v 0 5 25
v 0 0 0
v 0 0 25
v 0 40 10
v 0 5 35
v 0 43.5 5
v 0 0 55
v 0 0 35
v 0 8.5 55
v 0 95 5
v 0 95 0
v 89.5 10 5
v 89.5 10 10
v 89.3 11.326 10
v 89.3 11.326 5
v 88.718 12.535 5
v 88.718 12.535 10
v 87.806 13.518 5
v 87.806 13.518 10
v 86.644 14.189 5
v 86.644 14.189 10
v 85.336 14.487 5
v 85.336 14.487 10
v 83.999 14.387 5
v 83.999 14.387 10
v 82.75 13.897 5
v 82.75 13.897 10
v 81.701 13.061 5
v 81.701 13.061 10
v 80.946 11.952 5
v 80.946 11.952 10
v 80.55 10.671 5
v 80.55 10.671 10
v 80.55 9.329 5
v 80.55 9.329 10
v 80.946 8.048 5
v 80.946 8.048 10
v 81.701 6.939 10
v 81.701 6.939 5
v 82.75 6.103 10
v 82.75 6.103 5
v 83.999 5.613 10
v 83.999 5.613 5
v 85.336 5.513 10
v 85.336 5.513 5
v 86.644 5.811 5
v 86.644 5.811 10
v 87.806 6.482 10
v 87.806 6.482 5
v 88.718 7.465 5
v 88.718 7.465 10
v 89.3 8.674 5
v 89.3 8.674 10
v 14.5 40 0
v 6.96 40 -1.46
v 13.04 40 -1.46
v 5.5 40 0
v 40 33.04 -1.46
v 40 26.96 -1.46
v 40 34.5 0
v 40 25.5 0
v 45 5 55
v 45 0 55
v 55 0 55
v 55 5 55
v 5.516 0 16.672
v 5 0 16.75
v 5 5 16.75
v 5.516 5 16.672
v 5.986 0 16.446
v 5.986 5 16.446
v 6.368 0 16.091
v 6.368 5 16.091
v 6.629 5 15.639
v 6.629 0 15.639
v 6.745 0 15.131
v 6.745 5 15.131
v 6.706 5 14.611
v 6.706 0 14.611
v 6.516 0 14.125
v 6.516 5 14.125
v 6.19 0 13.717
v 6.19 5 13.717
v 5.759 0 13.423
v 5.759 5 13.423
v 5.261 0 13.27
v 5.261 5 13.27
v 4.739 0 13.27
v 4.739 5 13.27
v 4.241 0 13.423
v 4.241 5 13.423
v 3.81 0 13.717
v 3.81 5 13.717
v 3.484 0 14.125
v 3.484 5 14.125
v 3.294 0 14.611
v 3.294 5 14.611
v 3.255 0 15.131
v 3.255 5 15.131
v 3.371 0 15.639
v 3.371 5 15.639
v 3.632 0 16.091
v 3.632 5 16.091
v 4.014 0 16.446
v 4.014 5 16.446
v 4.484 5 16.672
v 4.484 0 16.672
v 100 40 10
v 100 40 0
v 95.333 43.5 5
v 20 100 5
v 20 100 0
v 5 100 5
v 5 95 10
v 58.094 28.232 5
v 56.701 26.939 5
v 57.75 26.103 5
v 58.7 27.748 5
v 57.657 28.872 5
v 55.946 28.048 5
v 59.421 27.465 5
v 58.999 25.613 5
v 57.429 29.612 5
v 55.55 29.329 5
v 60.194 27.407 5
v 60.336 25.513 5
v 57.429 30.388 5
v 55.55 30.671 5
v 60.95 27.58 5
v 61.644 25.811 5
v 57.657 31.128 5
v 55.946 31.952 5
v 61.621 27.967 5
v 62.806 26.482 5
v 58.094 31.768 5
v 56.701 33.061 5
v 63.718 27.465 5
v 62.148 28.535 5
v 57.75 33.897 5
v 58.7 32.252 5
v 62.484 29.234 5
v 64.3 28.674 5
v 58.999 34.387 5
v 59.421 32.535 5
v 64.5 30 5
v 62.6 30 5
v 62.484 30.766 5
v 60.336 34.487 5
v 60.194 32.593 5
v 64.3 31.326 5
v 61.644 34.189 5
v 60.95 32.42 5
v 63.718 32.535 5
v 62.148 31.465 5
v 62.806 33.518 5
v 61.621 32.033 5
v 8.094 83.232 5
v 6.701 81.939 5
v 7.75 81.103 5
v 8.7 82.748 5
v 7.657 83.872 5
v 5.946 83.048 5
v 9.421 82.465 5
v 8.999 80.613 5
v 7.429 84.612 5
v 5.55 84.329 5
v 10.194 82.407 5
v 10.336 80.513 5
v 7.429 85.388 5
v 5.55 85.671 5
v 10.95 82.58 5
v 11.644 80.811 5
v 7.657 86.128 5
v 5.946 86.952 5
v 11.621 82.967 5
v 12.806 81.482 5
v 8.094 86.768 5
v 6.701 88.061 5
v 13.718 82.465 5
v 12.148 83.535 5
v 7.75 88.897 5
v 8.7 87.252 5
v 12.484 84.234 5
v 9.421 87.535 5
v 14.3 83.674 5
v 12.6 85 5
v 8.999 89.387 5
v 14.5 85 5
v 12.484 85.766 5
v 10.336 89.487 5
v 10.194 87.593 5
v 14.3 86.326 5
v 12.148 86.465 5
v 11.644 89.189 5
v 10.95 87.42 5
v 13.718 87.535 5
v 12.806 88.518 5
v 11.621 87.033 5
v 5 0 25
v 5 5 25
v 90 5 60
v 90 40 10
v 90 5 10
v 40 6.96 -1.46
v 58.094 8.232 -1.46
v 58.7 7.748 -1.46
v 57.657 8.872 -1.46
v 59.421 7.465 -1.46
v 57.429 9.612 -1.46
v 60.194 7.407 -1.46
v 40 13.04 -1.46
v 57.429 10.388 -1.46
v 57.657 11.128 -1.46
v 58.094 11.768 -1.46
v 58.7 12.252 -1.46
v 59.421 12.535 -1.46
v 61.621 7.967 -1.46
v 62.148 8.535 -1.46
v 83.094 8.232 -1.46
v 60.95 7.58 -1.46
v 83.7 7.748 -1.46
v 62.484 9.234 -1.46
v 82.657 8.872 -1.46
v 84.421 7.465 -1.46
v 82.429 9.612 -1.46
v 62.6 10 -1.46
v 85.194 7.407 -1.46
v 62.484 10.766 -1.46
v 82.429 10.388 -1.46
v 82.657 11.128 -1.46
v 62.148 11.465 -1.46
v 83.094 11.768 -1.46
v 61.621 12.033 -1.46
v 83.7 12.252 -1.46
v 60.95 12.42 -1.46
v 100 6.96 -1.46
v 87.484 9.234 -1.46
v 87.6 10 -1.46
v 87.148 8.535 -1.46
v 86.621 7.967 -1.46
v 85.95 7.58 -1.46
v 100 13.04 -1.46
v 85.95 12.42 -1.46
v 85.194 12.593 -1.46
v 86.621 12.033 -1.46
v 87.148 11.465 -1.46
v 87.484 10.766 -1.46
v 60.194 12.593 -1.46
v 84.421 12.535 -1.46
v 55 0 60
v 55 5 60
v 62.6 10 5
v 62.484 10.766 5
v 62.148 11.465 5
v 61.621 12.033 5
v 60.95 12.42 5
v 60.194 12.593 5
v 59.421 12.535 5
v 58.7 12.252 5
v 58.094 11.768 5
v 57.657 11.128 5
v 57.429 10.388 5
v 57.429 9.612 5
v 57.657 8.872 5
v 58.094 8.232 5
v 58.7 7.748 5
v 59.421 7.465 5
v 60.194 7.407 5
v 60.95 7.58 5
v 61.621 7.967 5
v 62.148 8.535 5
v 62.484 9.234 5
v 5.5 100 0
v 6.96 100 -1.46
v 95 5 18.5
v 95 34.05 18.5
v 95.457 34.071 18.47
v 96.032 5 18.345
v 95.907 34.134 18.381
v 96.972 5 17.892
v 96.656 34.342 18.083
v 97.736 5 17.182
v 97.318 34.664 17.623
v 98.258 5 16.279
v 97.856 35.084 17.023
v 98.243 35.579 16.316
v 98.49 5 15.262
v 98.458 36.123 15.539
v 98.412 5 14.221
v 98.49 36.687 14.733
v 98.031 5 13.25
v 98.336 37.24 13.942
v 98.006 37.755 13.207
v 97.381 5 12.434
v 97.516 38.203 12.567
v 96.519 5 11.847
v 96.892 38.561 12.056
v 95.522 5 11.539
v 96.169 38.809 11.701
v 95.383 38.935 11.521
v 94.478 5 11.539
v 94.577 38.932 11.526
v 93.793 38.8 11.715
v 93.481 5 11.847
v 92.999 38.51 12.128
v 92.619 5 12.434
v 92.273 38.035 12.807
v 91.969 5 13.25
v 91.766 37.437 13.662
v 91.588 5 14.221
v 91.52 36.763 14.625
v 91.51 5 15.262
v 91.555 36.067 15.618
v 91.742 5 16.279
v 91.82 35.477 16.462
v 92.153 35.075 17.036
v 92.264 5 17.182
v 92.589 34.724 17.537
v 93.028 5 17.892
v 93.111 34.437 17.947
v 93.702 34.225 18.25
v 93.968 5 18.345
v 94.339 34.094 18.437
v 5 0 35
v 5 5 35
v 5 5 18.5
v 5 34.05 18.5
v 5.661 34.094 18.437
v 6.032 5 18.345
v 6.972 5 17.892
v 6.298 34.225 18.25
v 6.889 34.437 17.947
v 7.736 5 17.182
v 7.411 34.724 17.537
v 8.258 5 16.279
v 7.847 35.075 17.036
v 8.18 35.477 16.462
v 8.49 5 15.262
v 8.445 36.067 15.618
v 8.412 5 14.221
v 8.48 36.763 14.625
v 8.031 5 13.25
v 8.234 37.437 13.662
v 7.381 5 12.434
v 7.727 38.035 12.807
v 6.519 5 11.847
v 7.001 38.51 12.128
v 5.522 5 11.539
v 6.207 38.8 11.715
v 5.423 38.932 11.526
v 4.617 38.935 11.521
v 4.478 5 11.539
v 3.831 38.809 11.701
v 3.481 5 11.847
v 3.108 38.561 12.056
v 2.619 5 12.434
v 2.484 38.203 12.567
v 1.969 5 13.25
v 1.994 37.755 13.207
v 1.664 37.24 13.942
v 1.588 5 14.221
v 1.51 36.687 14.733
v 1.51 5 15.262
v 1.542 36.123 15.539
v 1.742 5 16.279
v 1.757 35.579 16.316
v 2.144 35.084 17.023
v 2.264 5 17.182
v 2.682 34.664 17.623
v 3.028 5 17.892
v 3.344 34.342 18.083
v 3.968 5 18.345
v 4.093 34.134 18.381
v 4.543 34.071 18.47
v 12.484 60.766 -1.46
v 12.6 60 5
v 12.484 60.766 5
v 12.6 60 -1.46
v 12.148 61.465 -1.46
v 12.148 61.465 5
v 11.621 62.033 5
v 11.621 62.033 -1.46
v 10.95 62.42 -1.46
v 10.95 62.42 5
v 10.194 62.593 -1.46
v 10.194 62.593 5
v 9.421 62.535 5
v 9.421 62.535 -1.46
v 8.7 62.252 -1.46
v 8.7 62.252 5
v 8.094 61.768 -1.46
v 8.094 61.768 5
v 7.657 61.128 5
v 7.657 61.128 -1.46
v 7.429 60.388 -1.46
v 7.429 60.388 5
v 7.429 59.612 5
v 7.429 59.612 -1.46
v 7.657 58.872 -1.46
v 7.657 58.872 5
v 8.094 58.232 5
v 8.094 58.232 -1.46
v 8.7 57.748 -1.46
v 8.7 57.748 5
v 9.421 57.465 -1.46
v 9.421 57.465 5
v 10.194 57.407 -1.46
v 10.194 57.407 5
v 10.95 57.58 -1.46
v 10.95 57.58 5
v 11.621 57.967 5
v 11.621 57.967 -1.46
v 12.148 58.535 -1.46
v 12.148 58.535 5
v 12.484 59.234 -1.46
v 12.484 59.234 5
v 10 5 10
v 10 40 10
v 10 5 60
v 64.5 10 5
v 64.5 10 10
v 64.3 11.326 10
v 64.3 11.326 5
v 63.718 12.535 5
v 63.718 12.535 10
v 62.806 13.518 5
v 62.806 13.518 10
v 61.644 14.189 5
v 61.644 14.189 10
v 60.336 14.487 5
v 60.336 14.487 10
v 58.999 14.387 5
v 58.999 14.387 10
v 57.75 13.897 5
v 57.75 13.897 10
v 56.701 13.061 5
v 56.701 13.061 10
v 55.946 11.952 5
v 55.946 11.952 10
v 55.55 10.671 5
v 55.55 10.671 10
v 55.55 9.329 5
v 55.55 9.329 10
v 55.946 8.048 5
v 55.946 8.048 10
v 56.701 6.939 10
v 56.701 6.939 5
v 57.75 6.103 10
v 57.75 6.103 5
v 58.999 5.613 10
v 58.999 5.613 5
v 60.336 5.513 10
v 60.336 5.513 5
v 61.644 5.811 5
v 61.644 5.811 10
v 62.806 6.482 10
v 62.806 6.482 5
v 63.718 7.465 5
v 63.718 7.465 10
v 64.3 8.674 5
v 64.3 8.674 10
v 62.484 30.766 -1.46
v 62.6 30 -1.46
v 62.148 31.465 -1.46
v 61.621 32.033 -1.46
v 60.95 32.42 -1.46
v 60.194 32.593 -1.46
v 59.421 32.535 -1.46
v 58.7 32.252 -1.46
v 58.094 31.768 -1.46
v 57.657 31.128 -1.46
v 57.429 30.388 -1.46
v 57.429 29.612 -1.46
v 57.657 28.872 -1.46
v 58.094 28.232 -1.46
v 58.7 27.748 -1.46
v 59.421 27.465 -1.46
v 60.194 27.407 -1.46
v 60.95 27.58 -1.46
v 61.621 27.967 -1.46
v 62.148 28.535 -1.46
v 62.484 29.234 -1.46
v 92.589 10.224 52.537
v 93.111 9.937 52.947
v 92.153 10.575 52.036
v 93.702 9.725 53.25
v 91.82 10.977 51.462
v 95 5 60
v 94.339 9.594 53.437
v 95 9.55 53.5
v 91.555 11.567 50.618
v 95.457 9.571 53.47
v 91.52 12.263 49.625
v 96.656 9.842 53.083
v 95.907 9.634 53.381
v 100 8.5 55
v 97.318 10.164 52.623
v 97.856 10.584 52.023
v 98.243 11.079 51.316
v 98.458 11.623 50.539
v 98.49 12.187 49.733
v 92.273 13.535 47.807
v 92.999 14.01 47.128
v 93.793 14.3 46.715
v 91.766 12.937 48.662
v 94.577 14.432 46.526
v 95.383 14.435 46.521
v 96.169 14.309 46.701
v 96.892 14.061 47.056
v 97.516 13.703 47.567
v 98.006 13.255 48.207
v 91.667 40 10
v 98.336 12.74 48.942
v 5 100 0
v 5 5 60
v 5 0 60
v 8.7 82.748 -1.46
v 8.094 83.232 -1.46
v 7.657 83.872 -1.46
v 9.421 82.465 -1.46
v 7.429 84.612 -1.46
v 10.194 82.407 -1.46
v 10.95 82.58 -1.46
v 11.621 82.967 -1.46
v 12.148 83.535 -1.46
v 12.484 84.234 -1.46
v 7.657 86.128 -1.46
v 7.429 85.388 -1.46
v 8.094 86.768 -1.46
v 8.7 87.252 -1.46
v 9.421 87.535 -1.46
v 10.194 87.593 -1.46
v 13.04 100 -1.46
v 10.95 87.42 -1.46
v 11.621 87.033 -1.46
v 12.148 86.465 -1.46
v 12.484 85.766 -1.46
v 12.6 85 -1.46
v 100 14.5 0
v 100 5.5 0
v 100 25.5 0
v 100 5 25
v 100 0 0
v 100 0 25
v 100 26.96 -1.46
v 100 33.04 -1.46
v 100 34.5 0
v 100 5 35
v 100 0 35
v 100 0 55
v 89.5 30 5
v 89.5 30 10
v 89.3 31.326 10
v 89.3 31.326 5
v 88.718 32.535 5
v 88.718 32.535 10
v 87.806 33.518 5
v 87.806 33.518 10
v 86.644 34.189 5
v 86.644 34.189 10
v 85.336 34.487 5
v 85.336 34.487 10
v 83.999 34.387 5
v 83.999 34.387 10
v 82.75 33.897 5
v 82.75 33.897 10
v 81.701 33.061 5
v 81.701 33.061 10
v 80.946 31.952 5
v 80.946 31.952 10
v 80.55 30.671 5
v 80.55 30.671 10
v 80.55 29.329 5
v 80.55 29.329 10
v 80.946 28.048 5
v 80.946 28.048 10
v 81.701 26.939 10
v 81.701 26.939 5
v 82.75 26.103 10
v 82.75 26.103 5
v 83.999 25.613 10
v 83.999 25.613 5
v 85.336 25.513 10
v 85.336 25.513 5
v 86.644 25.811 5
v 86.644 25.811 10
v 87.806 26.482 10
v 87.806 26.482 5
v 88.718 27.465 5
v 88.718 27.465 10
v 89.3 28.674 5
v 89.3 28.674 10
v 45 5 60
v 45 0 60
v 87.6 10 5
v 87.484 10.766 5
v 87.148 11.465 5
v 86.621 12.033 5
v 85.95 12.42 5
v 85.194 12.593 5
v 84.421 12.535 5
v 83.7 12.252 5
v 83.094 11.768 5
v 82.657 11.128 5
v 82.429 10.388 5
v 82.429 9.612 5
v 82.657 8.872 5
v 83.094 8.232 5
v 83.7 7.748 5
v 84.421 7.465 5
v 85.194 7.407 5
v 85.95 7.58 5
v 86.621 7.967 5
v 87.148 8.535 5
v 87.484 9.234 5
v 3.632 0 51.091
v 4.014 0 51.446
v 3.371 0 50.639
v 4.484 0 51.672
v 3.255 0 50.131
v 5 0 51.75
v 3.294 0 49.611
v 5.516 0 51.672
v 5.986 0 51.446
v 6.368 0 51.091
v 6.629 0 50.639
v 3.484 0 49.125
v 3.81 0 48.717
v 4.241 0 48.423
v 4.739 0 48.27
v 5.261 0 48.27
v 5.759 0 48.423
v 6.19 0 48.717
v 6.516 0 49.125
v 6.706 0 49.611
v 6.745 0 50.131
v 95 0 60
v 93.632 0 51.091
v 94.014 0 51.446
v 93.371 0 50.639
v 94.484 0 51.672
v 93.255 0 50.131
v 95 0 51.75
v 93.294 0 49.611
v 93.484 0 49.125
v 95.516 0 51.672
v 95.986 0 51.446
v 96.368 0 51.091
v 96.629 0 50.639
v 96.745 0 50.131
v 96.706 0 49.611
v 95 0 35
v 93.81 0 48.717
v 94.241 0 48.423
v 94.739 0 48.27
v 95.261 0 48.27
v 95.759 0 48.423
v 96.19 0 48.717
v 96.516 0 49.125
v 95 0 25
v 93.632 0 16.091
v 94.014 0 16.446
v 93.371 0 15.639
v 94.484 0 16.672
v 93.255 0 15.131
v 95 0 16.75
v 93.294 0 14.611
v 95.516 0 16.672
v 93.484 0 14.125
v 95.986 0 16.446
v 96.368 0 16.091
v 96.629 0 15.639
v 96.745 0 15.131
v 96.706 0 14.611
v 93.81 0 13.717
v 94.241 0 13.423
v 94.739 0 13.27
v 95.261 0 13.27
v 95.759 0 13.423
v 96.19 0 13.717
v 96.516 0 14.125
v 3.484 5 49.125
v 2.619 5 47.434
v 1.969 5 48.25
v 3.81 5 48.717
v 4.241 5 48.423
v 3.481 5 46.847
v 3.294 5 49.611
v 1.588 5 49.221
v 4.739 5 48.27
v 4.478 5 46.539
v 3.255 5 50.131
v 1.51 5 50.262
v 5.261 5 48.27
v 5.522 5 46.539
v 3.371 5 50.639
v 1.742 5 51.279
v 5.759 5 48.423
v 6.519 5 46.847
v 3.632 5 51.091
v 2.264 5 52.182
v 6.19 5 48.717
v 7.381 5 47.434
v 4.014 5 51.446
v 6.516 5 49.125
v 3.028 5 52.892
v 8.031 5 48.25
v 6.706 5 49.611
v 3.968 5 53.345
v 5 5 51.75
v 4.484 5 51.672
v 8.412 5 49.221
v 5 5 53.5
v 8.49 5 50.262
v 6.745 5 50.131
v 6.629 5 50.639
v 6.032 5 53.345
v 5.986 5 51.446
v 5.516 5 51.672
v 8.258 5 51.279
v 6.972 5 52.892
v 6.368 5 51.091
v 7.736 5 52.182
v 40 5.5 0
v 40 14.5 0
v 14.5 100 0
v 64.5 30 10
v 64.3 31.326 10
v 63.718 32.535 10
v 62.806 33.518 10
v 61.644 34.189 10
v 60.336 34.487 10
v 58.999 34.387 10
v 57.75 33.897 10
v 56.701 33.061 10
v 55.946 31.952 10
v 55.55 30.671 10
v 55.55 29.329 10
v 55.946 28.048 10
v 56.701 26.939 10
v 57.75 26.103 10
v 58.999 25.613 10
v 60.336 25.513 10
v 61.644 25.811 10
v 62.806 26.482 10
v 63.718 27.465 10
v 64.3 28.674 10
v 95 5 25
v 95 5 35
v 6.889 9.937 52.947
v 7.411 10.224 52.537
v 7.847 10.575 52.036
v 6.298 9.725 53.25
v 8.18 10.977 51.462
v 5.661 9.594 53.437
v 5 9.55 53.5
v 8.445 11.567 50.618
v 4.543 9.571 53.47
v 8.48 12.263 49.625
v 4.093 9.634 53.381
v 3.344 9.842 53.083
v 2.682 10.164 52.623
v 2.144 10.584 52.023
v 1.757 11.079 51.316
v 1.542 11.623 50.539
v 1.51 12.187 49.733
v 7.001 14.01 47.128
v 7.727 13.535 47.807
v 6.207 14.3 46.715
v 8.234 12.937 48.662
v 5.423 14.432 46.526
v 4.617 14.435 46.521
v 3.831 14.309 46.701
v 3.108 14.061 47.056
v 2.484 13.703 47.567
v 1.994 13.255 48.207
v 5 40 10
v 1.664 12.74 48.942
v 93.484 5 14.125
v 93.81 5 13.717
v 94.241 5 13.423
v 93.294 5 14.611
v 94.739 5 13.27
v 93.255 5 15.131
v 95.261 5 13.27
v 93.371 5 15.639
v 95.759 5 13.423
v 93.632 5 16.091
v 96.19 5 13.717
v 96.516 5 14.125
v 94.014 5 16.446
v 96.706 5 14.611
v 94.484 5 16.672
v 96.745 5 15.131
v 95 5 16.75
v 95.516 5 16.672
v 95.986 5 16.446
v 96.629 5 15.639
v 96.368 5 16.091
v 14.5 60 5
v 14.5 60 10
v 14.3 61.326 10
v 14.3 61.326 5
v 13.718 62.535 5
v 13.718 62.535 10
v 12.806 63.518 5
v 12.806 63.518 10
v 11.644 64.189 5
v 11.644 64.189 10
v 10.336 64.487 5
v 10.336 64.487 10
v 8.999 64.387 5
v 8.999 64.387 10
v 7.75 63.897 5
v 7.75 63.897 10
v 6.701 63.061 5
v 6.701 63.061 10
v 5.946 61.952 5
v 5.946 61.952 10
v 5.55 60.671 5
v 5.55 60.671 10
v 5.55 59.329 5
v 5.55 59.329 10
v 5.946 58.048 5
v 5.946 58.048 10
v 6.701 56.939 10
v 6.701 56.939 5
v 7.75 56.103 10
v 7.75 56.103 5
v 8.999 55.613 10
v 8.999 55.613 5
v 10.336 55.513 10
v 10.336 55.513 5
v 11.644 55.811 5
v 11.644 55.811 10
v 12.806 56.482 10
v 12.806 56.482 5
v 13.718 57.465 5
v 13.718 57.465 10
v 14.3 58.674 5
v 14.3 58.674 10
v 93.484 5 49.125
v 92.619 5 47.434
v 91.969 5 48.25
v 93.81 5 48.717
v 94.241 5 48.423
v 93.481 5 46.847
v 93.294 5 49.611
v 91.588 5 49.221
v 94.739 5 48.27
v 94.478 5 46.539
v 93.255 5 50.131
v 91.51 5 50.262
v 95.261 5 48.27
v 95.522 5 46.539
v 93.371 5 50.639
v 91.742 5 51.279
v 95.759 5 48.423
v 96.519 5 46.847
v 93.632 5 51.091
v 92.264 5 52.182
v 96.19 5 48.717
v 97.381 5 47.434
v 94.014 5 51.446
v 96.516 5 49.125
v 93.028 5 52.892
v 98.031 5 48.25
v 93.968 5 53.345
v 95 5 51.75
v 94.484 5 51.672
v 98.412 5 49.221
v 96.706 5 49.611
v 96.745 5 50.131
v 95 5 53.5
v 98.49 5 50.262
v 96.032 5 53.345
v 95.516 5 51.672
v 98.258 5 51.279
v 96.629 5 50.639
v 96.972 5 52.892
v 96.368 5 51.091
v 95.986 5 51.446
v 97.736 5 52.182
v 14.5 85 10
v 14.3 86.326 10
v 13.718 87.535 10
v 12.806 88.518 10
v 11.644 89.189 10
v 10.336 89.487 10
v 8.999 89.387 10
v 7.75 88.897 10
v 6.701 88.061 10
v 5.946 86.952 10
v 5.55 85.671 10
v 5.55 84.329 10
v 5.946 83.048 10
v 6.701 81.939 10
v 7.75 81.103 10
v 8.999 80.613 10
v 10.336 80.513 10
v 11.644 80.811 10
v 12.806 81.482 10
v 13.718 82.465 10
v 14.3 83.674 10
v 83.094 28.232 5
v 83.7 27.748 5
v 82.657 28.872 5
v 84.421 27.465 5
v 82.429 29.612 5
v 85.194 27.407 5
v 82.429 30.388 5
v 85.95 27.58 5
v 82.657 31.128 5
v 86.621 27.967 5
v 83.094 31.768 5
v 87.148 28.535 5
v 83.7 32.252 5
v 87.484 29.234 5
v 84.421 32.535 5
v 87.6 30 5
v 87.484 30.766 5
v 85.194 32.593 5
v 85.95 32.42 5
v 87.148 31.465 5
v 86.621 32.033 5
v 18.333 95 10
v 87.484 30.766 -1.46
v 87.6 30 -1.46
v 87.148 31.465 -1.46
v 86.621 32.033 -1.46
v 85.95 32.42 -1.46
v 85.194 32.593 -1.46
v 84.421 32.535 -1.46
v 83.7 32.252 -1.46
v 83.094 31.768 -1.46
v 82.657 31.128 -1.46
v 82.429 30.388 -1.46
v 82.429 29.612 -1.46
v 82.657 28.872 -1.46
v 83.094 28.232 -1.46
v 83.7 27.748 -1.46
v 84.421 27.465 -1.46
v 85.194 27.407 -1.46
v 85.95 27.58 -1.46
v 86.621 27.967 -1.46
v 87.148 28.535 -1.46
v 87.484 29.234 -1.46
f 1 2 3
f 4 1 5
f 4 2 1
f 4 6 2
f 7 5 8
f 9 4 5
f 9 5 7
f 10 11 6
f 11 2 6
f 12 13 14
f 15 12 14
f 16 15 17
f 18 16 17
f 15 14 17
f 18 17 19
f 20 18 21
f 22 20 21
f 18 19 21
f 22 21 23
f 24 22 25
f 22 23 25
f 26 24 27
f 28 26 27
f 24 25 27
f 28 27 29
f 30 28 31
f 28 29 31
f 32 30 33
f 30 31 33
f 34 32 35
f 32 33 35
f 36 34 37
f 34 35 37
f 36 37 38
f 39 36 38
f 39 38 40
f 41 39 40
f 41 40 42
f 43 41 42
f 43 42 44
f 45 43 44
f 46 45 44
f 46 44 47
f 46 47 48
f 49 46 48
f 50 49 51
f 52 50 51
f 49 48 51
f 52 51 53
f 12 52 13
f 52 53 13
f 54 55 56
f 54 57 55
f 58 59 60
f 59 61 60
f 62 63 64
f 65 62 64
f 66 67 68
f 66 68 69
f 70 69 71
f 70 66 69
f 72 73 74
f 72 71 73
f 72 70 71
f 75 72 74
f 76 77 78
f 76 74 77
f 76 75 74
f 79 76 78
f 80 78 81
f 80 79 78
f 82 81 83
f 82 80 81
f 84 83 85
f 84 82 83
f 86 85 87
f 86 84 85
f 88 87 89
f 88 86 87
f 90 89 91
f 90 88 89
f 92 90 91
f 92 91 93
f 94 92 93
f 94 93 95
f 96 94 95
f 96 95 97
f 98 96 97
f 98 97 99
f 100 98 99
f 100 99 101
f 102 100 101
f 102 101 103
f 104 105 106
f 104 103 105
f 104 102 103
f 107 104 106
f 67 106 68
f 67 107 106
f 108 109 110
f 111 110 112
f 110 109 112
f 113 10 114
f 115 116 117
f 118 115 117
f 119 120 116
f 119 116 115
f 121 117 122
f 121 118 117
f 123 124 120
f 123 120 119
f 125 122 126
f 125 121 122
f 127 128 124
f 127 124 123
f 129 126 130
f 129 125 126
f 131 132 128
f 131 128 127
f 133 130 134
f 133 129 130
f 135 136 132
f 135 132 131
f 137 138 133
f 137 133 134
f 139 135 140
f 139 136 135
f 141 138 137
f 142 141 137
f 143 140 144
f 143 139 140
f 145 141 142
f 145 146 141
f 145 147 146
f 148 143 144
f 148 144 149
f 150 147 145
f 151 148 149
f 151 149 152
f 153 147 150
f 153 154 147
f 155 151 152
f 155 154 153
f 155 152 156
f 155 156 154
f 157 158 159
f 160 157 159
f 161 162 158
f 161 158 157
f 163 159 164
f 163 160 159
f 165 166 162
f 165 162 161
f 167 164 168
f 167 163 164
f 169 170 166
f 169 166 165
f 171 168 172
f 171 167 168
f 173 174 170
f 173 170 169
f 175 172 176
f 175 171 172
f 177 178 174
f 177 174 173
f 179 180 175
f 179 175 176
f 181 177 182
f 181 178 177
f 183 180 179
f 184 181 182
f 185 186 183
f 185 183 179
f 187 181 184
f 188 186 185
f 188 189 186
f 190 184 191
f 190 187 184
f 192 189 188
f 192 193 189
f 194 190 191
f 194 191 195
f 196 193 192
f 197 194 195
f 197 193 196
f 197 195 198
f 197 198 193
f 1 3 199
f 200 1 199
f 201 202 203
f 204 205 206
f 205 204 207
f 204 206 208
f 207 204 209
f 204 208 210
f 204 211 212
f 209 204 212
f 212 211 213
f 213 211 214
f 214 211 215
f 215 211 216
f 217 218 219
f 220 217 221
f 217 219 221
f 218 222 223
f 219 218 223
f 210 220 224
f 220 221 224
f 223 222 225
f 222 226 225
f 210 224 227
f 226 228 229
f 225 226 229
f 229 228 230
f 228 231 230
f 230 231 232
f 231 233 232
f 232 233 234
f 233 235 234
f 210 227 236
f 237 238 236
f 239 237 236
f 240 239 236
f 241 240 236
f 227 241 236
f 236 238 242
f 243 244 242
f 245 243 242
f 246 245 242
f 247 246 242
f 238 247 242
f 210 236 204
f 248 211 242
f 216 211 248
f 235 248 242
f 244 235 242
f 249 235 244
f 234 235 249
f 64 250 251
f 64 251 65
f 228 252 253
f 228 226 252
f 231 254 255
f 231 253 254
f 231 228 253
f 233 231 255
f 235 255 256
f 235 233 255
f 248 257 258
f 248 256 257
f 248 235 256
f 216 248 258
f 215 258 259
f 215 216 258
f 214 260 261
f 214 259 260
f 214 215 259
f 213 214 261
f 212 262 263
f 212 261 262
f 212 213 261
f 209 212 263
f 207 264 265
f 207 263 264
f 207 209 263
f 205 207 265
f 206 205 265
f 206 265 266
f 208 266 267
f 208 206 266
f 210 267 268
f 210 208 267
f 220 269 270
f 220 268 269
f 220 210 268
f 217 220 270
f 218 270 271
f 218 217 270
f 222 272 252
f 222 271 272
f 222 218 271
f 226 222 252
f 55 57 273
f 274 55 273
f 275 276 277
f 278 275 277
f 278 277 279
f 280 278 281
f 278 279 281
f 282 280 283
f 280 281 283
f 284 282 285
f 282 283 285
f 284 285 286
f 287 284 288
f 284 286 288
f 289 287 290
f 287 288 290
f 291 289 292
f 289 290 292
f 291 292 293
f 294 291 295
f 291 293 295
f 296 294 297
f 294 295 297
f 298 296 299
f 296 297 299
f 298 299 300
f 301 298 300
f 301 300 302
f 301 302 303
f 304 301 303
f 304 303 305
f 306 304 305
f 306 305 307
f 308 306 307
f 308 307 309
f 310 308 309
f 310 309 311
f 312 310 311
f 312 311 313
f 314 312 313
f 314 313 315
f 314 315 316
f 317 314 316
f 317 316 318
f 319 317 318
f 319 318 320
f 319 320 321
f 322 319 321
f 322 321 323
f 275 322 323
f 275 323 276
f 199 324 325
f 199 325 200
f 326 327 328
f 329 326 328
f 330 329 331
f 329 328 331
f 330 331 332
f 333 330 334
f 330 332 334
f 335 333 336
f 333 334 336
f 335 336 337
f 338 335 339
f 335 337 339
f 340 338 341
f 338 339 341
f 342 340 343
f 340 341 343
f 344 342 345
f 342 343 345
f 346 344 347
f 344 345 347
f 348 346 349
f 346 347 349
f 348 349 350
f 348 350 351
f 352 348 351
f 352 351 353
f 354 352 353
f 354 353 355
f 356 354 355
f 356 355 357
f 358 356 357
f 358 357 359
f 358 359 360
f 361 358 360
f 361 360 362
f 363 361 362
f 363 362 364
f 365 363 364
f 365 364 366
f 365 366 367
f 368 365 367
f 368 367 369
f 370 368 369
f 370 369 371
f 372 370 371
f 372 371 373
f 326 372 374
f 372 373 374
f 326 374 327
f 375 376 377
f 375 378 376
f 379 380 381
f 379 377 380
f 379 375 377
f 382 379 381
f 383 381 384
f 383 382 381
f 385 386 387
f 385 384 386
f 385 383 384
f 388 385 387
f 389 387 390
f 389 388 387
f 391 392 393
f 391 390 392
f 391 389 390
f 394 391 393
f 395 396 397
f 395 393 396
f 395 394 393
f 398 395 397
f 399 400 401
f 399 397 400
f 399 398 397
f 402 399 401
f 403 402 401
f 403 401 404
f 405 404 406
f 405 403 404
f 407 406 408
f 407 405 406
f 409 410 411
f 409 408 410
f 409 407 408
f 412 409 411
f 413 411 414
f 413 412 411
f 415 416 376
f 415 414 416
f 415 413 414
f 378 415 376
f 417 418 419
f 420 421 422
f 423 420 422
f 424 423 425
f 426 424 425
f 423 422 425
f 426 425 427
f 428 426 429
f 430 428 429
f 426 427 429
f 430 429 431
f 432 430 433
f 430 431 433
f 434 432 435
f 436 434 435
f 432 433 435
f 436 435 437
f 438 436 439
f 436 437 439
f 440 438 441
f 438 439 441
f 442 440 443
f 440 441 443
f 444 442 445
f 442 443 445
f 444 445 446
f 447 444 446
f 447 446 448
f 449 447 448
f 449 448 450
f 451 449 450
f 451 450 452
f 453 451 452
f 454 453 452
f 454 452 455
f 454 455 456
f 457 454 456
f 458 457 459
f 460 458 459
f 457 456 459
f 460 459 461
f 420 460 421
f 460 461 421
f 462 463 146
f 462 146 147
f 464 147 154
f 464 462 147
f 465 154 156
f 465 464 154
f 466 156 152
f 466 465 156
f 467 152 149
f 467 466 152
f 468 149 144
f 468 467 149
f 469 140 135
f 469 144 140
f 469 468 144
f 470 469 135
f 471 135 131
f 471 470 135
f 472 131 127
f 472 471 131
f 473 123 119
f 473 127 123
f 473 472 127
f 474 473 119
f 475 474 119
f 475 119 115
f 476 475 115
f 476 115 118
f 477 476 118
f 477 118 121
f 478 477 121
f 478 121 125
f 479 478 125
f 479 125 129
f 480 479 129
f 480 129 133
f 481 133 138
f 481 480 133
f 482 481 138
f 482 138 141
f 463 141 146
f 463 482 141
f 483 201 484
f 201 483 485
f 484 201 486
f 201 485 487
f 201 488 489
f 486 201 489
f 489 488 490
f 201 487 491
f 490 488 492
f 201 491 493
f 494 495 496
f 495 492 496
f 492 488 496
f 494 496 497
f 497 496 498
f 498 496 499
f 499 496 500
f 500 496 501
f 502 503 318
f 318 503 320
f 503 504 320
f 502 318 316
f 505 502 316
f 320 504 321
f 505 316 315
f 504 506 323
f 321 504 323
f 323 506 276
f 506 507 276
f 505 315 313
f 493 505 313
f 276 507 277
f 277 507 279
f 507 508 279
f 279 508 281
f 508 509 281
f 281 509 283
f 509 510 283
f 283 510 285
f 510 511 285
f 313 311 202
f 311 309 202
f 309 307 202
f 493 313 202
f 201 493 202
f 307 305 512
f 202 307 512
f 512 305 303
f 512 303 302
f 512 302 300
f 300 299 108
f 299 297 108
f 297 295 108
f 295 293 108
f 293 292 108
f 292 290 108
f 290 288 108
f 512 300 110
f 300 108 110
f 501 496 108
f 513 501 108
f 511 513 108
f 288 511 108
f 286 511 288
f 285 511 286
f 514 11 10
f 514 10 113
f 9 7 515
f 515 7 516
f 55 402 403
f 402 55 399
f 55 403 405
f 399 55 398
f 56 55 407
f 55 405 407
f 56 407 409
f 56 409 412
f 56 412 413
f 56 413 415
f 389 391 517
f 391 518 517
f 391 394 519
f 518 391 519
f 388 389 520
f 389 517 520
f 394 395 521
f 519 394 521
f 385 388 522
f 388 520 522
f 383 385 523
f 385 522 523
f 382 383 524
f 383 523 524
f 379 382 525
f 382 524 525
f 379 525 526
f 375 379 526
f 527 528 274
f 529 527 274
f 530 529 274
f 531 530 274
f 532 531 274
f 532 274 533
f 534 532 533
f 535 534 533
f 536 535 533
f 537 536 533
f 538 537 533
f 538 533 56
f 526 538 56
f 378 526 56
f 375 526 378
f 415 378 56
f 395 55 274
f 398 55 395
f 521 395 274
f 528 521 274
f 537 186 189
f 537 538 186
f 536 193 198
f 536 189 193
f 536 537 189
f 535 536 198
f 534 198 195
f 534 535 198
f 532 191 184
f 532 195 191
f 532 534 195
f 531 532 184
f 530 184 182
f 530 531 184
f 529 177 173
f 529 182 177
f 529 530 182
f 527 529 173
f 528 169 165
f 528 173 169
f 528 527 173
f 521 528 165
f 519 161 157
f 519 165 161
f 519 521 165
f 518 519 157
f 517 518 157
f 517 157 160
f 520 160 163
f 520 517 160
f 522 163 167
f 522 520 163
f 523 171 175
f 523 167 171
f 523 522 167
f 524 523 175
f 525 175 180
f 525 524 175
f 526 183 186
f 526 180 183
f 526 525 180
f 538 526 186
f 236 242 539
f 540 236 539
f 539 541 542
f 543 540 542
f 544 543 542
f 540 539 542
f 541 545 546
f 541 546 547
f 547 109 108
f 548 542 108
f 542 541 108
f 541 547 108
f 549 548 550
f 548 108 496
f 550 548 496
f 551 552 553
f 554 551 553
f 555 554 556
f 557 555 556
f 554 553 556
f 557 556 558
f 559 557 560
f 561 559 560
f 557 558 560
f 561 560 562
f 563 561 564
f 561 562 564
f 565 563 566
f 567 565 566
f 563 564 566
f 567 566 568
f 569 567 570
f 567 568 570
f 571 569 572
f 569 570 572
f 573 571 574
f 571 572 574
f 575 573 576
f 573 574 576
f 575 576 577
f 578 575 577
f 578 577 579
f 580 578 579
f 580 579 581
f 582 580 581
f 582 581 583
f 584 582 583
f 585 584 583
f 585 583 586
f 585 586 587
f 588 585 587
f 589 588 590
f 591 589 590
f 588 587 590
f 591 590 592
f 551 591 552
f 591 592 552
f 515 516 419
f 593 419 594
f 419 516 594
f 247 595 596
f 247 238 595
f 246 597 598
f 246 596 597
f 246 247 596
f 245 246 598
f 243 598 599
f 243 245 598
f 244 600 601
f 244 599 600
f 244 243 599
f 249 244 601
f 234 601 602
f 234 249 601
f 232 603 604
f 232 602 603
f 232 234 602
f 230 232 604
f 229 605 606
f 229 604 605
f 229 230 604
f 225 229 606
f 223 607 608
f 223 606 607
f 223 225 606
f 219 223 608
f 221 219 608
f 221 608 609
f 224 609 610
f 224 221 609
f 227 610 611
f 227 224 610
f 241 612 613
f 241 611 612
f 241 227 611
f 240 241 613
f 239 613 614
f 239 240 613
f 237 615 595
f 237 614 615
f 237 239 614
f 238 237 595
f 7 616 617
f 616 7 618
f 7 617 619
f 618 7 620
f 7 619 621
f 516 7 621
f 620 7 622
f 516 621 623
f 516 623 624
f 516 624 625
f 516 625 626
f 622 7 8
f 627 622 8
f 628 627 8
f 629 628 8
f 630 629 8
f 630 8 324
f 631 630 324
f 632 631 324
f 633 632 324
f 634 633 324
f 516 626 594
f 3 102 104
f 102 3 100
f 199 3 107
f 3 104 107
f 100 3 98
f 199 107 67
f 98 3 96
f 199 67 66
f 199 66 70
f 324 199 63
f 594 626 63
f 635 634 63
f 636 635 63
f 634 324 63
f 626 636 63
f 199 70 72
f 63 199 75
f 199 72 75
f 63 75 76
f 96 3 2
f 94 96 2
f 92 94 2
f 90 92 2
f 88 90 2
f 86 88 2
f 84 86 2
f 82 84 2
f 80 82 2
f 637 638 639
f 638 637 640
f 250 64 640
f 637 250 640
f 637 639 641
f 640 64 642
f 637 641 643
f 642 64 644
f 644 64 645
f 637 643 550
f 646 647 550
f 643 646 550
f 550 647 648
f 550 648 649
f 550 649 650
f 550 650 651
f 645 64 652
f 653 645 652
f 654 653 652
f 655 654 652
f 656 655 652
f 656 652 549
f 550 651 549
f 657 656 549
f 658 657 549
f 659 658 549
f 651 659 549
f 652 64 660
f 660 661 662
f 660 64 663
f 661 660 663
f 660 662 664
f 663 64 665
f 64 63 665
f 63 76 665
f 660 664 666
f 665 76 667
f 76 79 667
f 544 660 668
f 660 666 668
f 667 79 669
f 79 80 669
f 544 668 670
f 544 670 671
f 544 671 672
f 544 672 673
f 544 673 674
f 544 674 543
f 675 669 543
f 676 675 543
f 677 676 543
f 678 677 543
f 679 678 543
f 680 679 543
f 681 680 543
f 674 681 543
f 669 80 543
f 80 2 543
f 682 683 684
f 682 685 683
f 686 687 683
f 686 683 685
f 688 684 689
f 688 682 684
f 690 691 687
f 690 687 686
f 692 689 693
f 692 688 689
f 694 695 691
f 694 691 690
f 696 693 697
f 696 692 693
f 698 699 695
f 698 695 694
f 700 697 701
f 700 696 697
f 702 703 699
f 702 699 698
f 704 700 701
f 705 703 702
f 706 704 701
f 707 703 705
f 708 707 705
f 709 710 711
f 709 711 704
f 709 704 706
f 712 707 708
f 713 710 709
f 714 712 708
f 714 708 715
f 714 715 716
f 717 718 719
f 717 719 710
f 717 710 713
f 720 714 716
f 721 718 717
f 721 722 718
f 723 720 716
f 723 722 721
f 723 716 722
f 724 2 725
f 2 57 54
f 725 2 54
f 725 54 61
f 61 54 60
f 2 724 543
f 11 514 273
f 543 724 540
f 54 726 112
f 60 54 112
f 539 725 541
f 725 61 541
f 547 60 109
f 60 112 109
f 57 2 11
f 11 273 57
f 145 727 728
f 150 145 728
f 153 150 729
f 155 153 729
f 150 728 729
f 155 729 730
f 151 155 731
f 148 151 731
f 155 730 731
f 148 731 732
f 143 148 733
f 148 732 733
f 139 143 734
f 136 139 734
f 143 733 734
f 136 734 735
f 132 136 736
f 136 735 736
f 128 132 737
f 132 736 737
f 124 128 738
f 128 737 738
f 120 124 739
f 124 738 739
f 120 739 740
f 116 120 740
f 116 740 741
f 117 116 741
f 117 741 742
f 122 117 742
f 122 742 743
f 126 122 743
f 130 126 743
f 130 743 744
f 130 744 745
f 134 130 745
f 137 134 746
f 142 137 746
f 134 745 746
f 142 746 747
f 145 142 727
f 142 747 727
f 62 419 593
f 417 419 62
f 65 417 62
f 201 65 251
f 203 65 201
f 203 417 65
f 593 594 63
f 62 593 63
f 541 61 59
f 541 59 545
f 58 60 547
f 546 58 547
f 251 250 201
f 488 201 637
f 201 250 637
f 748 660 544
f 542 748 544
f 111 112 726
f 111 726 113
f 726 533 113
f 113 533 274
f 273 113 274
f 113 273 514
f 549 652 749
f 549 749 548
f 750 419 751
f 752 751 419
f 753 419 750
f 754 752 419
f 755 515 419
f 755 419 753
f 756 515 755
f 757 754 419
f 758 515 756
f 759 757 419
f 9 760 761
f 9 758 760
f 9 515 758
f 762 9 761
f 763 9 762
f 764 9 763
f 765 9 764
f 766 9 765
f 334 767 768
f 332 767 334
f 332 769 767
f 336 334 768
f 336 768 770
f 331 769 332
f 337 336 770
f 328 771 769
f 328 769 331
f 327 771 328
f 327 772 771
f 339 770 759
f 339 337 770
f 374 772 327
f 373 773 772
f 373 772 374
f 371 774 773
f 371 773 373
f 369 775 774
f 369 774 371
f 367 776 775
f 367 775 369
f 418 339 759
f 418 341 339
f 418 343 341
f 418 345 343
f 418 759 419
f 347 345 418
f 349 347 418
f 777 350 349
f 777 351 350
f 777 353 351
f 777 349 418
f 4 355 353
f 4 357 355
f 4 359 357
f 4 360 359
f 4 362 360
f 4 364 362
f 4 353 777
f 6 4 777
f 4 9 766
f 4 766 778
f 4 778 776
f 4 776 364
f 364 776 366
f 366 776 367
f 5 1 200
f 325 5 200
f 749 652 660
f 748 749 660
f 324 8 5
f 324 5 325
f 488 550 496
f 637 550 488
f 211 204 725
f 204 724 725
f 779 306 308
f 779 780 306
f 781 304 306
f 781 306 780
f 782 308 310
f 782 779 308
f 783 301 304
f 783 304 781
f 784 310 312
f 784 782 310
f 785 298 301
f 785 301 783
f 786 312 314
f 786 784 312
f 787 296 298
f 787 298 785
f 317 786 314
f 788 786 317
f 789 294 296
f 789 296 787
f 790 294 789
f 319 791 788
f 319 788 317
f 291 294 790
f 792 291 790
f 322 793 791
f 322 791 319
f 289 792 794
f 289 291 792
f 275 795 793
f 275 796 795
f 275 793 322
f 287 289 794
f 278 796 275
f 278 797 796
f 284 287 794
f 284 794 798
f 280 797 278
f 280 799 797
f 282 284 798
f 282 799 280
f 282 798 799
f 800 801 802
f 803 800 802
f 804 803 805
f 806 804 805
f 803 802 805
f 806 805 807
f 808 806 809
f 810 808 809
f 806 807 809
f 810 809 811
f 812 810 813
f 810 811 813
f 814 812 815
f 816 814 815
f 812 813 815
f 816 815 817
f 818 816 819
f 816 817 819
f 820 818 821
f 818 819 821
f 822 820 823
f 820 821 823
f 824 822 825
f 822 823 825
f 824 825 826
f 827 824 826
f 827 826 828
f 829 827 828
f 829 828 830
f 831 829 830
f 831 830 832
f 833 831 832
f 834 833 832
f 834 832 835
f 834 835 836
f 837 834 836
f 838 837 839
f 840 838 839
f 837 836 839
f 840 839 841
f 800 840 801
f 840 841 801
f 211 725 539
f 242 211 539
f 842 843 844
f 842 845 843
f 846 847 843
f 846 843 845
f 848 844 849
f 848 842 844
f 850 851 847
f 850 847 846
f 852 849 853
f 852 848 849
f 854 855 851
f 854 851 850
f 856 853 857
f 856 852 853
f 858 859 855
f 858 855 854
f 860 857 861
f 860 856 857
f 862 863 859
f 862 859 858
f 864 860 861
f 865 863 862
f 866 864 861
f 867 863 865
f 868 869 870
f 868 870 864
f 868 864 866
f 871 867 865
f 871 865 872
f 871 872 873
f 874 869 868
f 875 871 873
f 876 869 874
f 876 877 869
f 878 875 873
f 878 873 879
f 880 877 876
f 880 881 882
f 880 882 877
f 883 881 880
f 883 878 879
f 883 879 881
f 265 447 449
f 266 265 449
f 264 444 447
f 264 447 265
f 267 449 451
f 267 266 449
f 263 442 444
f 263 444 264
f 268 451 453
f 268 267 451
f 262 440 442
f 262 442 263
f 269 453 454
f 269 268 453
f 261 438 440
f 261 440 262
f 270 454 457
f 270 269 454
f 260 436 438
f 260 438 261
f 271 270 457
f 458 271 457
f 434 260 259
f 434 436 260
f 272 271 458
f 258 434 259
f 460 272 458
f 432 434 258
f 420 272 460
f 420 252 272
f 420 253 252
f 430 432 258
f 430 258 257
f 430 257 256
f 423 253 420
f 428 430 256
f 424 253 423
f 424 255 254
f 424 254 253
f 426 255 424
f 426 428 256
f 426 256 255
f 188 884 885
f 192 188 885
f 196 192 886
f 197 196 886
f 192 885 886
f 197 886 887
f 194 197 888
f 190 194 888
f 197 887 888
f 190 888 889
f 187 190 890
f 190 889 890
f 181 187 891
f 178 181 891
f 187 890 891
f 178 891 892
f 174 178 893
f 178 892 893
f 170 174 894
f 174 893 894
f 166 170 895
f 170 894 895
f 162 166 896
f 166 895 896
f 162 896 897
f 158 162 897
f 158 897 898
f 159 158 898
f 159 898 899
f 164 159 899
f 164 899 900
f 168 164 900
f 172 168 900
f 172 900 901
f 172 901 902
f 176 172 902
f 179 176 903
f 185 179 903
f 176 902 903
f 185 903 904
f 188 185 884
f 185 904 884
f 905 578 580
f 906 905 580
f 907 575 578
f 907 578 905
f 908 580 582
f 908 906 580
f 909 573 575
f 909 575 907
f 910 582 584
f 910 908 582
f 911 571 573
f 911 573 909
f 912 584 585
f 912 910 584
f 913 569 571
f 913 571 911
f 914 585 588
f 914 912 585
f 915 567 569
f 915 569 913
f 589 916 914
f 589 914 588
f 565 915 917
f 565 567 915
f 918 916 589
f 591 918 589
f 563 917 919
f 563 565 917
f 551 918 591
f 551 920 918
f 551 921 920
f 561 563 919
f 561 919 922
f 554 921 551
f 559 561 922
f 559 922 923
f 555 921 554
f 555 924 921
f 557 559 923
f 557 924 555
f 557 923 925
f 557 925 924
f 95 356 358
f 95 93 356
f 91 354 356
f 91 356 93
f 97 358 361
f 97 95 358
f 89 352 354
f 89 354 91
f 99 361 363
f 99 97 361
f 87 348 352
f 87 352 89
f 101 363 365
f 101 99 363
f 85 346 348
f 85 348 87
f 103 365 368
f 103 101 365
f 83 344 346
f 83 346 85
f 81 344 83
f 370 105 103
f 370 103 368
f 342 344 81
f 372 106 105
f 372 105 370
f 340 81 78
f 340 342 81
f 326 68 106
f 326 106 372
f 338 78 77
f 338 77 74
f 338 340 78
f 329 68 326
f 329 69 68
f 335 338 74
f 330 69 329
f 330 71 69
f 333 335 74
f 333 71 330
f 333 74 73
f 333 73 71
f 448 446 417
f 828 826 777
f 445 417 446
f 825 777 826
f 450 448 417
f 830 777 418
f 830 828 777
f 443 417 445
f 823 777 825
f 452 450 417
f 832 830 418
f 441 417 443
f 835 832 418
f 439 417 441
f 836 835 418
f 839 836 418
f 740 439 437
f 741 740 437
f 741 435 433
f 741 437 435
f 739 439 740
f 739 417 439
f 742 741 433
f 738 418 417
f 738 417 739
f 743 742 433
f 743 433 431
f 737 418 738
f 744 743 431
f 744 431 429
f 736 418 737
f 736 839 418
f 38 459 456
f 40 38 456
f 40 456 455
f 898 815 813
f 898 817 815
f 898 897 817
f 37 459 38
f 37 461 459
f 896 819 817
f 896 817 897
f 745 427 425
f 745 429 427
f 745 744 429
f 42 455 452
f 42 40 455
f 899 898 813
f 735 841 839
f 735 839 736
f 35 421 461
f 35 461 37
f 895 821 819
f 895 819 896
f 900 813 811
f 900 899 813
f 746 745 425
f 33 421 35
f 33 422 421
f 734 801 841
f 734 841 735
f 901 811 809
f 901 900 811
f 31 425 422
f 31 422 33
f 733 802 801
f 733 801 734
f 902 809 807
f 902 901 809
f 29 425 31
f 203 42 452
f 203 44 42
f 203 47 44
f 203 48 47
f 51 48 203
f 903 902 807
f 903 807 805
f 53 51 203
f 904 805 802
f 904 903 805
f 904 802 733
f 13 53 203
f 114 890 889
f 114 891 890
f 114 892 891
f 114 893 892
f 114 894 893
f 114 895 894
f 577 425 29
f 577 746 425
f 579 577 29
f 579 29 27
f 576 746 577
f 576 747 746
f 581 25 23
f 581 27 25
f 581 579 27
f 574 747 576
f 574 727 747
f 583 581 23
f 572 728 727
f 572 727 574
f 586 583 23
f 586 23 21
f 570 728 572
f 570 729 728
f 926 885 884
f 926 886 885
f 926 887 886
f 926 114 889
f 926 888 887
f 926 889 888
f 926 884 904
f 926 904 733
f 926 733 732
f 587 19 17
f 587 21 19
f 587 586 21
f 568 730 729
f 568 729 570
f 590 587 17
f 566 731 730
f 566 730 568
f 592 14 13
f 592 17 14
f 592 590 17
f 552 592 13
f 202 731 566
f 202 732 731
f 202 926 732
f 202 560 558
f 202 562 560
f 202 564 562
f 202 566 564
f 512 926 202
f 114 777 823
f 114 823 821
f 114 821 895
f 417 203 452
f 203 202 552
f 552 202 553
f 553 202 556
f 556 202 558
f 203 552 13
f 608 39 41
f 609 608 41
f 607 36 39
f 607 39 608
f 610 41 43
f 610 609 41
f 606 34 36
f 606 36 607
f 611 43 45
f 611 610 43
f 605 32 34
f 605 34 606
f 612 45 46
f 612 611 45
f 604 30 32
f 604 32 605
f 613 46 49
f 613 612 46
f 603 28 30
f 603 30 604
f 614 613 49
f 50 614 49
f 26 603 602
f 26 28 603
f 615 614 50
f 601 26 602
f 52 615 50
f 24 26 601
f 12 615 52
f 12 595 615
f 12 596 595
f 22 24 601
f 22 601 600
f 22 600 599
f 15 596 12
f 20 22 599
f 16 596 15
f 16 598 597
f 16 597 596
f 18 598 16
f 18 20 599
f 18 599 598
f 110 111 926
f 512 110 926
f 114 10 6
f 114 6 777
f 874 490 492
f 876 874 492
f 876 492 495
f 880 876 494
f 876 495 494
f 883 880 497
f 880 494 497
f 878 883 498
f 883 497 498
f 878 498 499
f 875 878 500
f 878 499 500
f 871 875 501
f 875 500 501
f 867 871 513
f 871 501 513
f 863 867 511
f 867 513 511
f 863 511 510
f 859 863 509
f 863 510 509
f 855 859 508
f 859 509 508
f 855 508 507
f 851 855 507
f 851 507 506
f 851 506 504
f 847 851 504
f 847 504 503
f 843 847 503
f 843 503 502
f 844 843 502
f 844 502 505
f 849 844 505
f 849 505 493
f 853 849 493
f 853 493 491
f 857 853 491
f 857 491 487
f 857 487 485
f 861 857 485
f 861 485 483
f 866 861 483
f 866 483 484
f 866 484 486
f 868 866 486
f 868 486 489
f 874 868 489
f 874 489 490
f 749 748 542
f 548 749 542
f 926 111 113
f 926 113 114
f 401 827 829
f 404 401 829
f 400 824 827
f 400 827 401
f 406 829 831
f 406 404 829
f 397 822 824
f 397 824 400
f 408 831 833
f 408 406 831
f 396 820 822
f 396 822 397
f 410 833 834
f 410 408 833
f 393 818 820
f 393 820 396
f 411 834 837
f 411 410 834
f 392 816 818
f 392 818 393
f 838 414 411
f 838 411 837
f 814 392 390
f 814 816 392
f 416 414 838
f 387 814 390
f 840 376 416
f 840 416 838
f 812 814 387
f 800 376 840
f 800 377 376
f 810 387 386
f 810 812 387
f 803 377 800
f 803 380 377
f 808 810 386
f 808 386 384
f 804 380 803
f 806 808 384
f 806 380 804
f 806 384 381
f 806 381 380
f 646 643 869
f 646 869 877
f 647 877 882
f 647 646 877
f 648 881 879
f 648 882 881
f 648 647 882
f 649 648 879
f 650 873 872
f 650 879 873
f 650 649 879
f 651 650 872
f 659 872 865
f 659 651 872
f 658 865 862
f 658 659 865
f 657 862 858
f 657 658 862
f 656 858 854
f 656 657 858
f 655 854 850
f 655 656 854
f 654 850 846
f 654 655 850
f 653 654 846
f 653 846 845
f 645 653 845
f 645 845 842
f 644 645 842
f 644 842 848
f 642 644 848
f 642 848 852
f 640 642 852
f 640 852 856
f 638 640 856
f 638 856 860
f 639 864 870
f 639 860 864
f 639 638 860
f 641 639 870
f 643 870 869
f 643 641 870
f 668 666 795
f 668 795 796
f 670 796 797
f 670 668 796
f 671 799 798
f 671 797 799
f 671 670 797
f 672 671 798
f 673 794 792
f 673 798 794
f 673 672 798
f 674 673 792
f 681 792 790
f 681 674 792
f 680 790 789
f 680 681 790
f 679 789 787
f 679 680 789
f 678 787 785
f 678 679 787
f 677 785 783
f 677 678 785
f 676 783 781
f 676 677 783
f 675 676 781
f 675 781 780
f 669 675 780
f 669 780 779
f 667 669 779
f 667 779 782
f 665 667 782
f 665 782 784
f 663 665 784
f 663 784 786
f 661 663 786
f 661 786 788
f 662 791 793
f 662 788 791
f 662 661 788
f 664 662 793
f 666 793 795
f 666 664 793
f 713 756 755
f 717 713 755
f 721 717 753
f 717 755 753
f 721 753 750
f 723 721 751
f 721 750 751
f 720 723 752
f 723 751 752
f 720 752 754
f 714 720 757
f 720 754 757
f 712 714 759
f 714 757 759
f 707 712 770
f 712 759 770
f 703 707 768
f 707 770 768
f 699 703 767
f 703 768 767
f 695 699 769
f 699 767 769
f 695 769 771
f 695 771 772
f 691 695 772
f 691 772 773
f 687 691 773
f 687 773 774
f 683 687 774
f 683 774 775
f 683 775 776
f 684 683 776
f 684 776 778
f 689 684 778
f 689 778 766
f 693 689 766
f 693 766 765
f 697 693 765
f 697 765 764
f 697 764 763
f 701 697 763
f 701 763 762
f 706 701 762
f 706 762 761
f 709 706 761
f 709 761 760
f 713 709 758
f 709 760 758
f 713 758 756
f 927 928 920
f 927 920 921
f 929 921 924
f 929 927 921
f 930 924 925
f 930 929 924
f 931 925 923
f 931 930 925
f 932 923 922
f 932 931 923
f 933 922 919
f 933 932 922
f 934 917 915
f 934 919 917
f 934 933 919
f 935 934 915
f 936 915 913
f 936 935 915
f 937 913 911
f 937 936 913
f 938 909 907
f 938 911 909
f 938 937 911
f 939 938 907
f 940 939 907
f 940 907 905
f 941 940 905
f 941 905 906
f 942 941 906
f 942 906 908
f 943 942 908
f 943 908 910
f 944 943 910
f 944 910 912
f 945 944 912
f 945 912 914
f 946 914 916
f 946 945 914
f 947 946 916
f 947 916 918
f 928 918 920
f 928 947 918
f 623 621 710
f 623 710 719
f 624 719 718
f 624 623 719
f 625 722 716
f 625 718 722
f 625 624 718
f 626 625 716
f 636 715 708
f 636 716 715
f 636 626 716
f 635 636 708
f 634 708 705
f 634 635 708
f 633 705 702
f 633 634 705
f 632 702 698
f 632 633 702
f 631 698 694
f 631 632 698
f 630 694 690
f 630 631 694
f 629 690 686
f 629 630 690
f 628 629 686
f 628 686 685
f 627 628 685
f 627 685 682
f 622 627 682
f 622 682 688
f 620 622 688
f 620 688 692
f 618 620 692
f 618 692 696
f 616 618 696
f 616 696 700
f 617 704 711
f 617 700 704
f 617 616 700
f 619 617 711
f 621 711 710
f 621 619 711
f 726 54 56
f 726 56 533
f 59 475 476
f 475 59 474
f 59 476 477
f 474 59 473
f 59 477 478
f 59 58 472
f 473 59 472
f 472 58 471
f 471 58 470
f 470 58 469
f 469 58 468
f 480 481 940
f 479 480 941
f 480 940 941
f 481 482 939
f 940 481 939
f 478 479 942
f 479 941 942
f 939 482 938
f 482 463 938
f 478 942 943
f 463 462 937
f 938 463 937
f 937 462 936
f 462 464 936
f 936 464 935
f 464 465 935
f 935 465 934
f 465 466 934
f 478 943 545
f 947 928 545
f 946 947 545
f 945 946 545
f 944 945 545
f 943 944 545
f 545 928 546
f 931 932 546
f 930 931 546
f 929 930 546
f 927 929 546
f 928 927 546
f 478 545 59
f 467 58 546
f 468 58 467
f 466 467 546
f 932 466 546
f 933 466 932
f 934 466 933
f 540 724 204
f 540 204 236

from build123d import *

# Parameters (mm, degrees)
BOSS_EXTRUDE1_DEPTH     = 10
SKETCH2_R               = 2.6
CUT_EXTRUDE1_DEPTH      = 142.774468788
SKETCH3_W               = 60
SKETCH3_H               = 9
SKETCH3_W_2             = 9
SKETCH3_H_2             = 60
BOSS_EXTRUDE3_DEPTH     = 1.46
CUT_EXTRUDE2_DEPTH      = 142.774468788
CUT_EXTRUDE2_DEPTH_BACK = 142.774468788
SKETCH2_2_R             = 2.6
CHAMFER1_SIZE           = 1.46
CUT_EXTRUDE3_START      = 10
SKETCH4_R               = 4.5
CUT_EXTRUDE3_DEPTH      = 5
SKETCH5_W               = 100
SKETCH5_H               = 50
BOSS_EXTRUDE4_DEPTH     = 5
BOSS_EXTRUDE5_DEPTH     = 10
BOSS_EXTRUDE6_START     = 100
BOSS_EXTRUDE6_DEPTH     = 10
CUT_EXTRUDE4_DEPTH      = 154.622914957
CUT_EXTRUDE4_DEPTH_BACK = 154.622914957
SKETCH10_R              = 1.75
CUT_EXTRUDE5_START      = 100
SKETCH11_R              = 3.5
CUT_EXTRUDE5_DEPTH      = 95
SKETCH12_W              = 10
SKETCH12_H              = 5
SKETCH12_W_2            = 5
SKETCH12_H_2            = 10
CUT_EXTRUDE6_DEPTH      = 5
CHAMFER2_SIZE           = 5


# Some blends are built 0.0001 mm under size
with BuildPart() as part:
    # Sketch1 → Boss-Extrude1 (new body)
    with BuildSketch(Plane.XY):
        Polygon((0, 0), (100, 0), (100, 40), (20, 100), (0, 100), align=None)
    extrude(amount=BOSS_EXTRUDE1_DEPTH)

    # Sketch2 → Cut-Extrude1 (cut, through all)
    with BuildSketch(Plane.XY):
        with Locations((10, 85)):
            Circle(SKETCH2_R)
        with Locations((10, 60)):
            Circle(SKETCH2_R)
        with Locations((85, 30)):
            Circle(SKETCH2_R)
        with Locations((85, 10)):
            Circle(SKETCH2_R)
        with Locations((60, 10)):
            Circle(SKETCH2_R)
        with Locations((60, 30)):
            Circle(SKETCH2_R)
    extrude(amount=CUT_EXTRUDE1_DEPTH, mode=Mode.SUBTRACT)

    # Sketch3 → Boss-Extrude3 (add)
    with BuildSketch(Plane.XY):
        with Locations((70, 30)):
            Rectangle(SKETCH3_W, SKETCH3_H)
        with Locations((70, 10)):
            Rectangle(SKETCH3_W, SKETCH3_H)
        with Locations((10, 70)):
            Rectangle(SKETCH3_W_2, SKETCH3_H_2)
    extrude(amount=-BOSS_EXTRUDE3_DEPTH)

    # Sketch2<2> → Cut-Extrude2 (cut, two sides: drawn at the far end of the back side and taken through both)
    with BuildSketch(Plane.XY.offset(-CUT_EXTRUDE2_DEPTH_BACK)):
        with Locations((10, 85)):
            Circle(SKETCH2_2_R)
        with Locations((10, 60)):
            Circle(SKETCH2_2_R)
        with Locations((85, 30)):
            Circle(SKETCH2_2_R)
        with Locations((85, 10)):
            Circle(SKETCH2_2_R)
        with Locations((60, 10)):
            Circle(SKETCH2_2_R)
        with Locations((60, 30)):
            Circle(SKETCH2_2_R)
    extrude(amount=CUT_EXTRUDE2_DEPTH + CUT_EXTRUDE2_DEPTH_BACK, mode=Mode.SUBTRACT)

    # Chamfer1
    chamfer1_edges = [part.edges().sort_by_distance(p)[0] for p in [
        (14.5, 70, -1.46),
        (5.5, 70, -1.46),
        (70, 5.5, -1.46),
        (70, 14.5, -1.46),
        (70, 25.5, -1.46),
        (70, 34.5, -1.46),
    ]]
    chamfer(chamfer1_edges, length=CHAMFER1_SIZE - 0.0001)  # a hair under: the kernel refuses the full size

    # Sketch4 → Cut-Extrude3 (cut)
    with BuildSketch(Plane.XY.offset(CUT_EXTRUDE3_START)):
        with Locations((10, 85)):
            Circle(SKETCH4_R)
        with Locations((10, 60)):
            Circle(SKETCH4_R)
        with Locations((60, 30)):
            Circle(SKETCH4_R)
        with Locations((85, 30)):
            Circle(SKETCH4_R)
        with Locations((85, 10)):
            Circle(SKETCH4_R)
        with Locations((60, 10)):
            Circle(SKETCH4_R)
    extrude(amount=-CUT_EXTRUDE3_DEPTH, mode=Mode.SUBTRACT)

    # Sketch5 → Boss-Extrude4 (add)
    with BuildSketch(Plane(origin=(0, 0, 0), x_dir=(1, 0, 0), z_dir=(0, 1, 0))):
        with Locations((50, -35)):
            Rectangle(SKETCH5_W, SKETCH5_H)
    extrude(amount=BOSS_EXTRUDE4_DEPTH)

    # Sketch8 → Boss-Extrude5 (add)
    with BuildSketch(Plane(origin=(0, 0, 0), x_dir=(0, 0, -1), z_dir=(1, 0, 0))):
        Polygon((-10, 5), (-60, 5), (-10, 40), align=None)
    extrude(amount=BOSS_EXTRUDE5_DEPTH)

    # Sketch8<2> → Boss-Extrude6 (add)
    with BuildSketch(Plane(origin=(0, 0, 0), x_dir=(0, 0, -1), z_dir=(1, 0, 0)).offset(BOSS_EXTRUDE6_START)):
        Polygon((-10, 5), (-60, 5), (-10, 40), align=None)
    extrude(amount=-BOSS_EXTRUDE6_DEPTH)

    # Sketch10 → Cut-Extrude4 (cut, two sides: drawn at the far end of the back side and taken through both)
    with BuildSketch(Plane(origin=(0, 0, 0), x_dir=(1, 0, 0), z_dir=(0, 1, 0)).offset(-CUT_EXTRUDE4_DEPTH_BACK)):
        with Locations(Location((5, -50, 0), (0, 0, 270))):
            Circle(SKETCH10_R)
        with Locations(Location((95, -50, 0), (0, 0, 270))):
            Circle(SKETCH10_R)
        with Locations(Location((95, -15, 0), (0, 0, 270))):
            Circle(SKETCH10_R)
        with Locations(Location((5, -15, 0), (0, 0, 270))):
            Circle(SKETCH10_R)
    extrude(amount=CUT_EXTRUDE4_DEPTH + CUT_EXTRUDE4_DEPTH_BACK, mode=Mode.SUBTRACT)

    # Sketch11 → Cut-Extrude5 (cut)
    with BuildSketch(Plane(origin=(0, 0, 0), x_dir=(1, 0, 0), z_dir=(0, 1, 0)).offset(CUT_EXTRUDE5_START)):
        with Locations(Location((5, -15, 0), (0, 0, 270))):
            Circle(SKETCH11_R)
        with Locations(Location((5, -50, 0), (0, 0, 270))):
            Circle(SKETCH11_R)
        with Locations(Location((95, -50, 0), (0, 0, 270))):
            Circle(SKETCH11_R)
        with Locations(Location((95, -15, 0), (0, 0, 270))):
            Circle(SKETCH11_R)
    extrude(amount=-CUT_EXTRUDE5_DEPTH, mode=Mode.SUBTRACT)

    # Sketch12 → Cut-Extrude6 (cut)
    with BuildSketch(Plane(origin=(0, 0, 0), x_dir=(1, 0, 0), z_dir=(0, 1, 0))):
        with Locations((50, -57.5)):
            Rectangle(SKETCH12_W, SKETCH12_H)
        with Locations((97.5, -30)):
            Rectangle(SKETCH12_W_2, SKETCH12_H_2)
        with Locations((2.5, -30)):
            Rectangle(SKETCH12_W_2, SKETCH12_H_2)
    extrude(amount=CUT_EXTRUDE6_DEPTH, mode=Mode.SUBTRACT)

    # Chamfer2
    # the kernel refuses this chamfer: 5 mm, written as the material it takes off along each edge
    with BuildSketch(Plane(origin=(3.333333333, 96.666666667, 6.666666667), x_dir=(-0.7071067811865474, 0, -0.7071067811865476), z_dir=(-0.5773502691896258, 0.5773502691896257, 0.5773502691896257))) as chamfer2_piece_1:
        Polygon((-3.535533906, 2.041241452), (3.535533906, 2.041241452), (0, -4.082482905), align=None)
    extrude(amount=6.350852961, mode=Mode.SUBTRACT)
    with BuildSketch(Plane(origin=(110.286731952, 32.284951036, 10), x_dir=(0.016497525966350957, 0.021996701288467948, -0.9996219169112968), z_dir=(-0.8000000000000002, 0.6, 0))) as chamfer2_piece_2_section:
        Polygon((CHAMFER2_SIZE * 0.999621916911, CHAMFER2_SIZE * 0.0274958766106), (-CHAMFER2_SIZE * 0.0274958766106, CHAMFER2_SIZE * 0.999621916911), (0, 0), align=None)
    chamfer2_piece_2 = extrude(amount=125.71682988, mode=Mode.PRIVATE)
    chamfer2_piece_2 = split(chamfer2_piece_2, bisect_by=Plane(origin=(56.438385269, 50.830938552, -5.472769359), z_dir=(0, 0.8192319205190406, 0.5734623443633283)), keep=Keep.TOP, mode=Mode.PRIVATE)
    add(chamfer2_piece_2, mode=Mode.SUBTRACT)
    with BuildSketch(Plane(origin=(100, -12.85841494, 60), x_dir=(0.0274958766105877, 0, -0.9996219169112968), z_dir=(0, 1, 0))) as chamfer2_piece_3:
        Polygon((CHAMFER2_SIZE * 0.999621916911, CHAMFER2_SIZE * 0.0274958766106), (-CHAMFER2_SIZE * 0.0274958766106, CHAMFER2_SIZE * 0.999621916911), (0, 0), align=None)
    extrude(amount=30.71682988, mode=Mode.SUBTRACT)
    with BuildSketch(Plane(origin=(0, -12.85841494, 60), x_dir=(-0.027495876610586372, 0, -0.9996219169112968), z_dir=(0, 1, 0))) as chamfer2_piece_4:
        Polygon((CHAMFER2_SIZE * 0.999621916911, -CHAMFER2_SIZE * 0.0274958766106), (-CHAMFER2_SIZE * 0.0274958766106, -CHAMFER2_SIZE * 0.999621916911), (0, 0), align=None)
    extrude(amount=30.71682988, mode=Mode.SUBTRACT)
    with BuildSketch(Plane(origin=(32.85841494, 100, 10), x_dir=(0, 0.0274958766105877, -0.9996219169112968), z_dir=(-1, 0, 0))) as chamfer2_piece_5:
        Polygon((CHAMFER2_SIZE * 0.999621916911, CHAMFER2_SIZE * 0.0274958766106), (-CHAMFER2_SIZE * 0.0274958766106, CHAMFER2_SIZE * 0.999621916911), (0, 0), align=None)
    extrude(amount=45.71682988, mode=Mode.SUBTRACT)
    with BuildSketch(Plane(origin=(0, 112.85841494, 10), x_dir=(-0.02749587661058638, 0, -0.9996219169112968), z_dir=(0, -1, 0))) as chamfer2_piece_6_section:
        Polygon((CHAMFER2_SIZE * 0.999621916911, CHAMFER2_SIZE * 0.0274958766106), (-CHAMFER2_SIZE * 0.0274958766106, CHAMFER2_SIZE * 0.999621916911), (0, 0), align=None)
    chamfer2_piece_6 = extrude(amount=85.71682988, mode=Mode.PRIVATE)
    chamfer2_piece_6 = split(chamfer2_piece_6, bisect_by=Plane(origin=(1.674929178, 50.830938552, -5.472769359), z_dir=(0, 0.8192319205190406, 0.5734623443633283)), keep=Keep.TOP, mode=Mode.PRIVATE)
    add(chamfer2_piece_6, mode=Mode.SUBTRACT)
    with BuildSketch(Plane(origin=(0, 100, -12.85841494), x_dir=(-0.027495876610586313, -0.9996219169112968, 0), z_dir=(0, 0, 1))) as chamfer2_piece_7:
        Polygon((CHAMFER2_SIZE * 0.999621916911, CHAMFER2_SIZE * 0.0274958766106), (-CHAMFER2_SIZE * 0.0274958766106, CHAMFER2_SIZE * 0.999621916911), (0, 0), align=None)
    extrude(amount=35.71682988, mode=Mode.SUBTRACT)


solid = part.part
